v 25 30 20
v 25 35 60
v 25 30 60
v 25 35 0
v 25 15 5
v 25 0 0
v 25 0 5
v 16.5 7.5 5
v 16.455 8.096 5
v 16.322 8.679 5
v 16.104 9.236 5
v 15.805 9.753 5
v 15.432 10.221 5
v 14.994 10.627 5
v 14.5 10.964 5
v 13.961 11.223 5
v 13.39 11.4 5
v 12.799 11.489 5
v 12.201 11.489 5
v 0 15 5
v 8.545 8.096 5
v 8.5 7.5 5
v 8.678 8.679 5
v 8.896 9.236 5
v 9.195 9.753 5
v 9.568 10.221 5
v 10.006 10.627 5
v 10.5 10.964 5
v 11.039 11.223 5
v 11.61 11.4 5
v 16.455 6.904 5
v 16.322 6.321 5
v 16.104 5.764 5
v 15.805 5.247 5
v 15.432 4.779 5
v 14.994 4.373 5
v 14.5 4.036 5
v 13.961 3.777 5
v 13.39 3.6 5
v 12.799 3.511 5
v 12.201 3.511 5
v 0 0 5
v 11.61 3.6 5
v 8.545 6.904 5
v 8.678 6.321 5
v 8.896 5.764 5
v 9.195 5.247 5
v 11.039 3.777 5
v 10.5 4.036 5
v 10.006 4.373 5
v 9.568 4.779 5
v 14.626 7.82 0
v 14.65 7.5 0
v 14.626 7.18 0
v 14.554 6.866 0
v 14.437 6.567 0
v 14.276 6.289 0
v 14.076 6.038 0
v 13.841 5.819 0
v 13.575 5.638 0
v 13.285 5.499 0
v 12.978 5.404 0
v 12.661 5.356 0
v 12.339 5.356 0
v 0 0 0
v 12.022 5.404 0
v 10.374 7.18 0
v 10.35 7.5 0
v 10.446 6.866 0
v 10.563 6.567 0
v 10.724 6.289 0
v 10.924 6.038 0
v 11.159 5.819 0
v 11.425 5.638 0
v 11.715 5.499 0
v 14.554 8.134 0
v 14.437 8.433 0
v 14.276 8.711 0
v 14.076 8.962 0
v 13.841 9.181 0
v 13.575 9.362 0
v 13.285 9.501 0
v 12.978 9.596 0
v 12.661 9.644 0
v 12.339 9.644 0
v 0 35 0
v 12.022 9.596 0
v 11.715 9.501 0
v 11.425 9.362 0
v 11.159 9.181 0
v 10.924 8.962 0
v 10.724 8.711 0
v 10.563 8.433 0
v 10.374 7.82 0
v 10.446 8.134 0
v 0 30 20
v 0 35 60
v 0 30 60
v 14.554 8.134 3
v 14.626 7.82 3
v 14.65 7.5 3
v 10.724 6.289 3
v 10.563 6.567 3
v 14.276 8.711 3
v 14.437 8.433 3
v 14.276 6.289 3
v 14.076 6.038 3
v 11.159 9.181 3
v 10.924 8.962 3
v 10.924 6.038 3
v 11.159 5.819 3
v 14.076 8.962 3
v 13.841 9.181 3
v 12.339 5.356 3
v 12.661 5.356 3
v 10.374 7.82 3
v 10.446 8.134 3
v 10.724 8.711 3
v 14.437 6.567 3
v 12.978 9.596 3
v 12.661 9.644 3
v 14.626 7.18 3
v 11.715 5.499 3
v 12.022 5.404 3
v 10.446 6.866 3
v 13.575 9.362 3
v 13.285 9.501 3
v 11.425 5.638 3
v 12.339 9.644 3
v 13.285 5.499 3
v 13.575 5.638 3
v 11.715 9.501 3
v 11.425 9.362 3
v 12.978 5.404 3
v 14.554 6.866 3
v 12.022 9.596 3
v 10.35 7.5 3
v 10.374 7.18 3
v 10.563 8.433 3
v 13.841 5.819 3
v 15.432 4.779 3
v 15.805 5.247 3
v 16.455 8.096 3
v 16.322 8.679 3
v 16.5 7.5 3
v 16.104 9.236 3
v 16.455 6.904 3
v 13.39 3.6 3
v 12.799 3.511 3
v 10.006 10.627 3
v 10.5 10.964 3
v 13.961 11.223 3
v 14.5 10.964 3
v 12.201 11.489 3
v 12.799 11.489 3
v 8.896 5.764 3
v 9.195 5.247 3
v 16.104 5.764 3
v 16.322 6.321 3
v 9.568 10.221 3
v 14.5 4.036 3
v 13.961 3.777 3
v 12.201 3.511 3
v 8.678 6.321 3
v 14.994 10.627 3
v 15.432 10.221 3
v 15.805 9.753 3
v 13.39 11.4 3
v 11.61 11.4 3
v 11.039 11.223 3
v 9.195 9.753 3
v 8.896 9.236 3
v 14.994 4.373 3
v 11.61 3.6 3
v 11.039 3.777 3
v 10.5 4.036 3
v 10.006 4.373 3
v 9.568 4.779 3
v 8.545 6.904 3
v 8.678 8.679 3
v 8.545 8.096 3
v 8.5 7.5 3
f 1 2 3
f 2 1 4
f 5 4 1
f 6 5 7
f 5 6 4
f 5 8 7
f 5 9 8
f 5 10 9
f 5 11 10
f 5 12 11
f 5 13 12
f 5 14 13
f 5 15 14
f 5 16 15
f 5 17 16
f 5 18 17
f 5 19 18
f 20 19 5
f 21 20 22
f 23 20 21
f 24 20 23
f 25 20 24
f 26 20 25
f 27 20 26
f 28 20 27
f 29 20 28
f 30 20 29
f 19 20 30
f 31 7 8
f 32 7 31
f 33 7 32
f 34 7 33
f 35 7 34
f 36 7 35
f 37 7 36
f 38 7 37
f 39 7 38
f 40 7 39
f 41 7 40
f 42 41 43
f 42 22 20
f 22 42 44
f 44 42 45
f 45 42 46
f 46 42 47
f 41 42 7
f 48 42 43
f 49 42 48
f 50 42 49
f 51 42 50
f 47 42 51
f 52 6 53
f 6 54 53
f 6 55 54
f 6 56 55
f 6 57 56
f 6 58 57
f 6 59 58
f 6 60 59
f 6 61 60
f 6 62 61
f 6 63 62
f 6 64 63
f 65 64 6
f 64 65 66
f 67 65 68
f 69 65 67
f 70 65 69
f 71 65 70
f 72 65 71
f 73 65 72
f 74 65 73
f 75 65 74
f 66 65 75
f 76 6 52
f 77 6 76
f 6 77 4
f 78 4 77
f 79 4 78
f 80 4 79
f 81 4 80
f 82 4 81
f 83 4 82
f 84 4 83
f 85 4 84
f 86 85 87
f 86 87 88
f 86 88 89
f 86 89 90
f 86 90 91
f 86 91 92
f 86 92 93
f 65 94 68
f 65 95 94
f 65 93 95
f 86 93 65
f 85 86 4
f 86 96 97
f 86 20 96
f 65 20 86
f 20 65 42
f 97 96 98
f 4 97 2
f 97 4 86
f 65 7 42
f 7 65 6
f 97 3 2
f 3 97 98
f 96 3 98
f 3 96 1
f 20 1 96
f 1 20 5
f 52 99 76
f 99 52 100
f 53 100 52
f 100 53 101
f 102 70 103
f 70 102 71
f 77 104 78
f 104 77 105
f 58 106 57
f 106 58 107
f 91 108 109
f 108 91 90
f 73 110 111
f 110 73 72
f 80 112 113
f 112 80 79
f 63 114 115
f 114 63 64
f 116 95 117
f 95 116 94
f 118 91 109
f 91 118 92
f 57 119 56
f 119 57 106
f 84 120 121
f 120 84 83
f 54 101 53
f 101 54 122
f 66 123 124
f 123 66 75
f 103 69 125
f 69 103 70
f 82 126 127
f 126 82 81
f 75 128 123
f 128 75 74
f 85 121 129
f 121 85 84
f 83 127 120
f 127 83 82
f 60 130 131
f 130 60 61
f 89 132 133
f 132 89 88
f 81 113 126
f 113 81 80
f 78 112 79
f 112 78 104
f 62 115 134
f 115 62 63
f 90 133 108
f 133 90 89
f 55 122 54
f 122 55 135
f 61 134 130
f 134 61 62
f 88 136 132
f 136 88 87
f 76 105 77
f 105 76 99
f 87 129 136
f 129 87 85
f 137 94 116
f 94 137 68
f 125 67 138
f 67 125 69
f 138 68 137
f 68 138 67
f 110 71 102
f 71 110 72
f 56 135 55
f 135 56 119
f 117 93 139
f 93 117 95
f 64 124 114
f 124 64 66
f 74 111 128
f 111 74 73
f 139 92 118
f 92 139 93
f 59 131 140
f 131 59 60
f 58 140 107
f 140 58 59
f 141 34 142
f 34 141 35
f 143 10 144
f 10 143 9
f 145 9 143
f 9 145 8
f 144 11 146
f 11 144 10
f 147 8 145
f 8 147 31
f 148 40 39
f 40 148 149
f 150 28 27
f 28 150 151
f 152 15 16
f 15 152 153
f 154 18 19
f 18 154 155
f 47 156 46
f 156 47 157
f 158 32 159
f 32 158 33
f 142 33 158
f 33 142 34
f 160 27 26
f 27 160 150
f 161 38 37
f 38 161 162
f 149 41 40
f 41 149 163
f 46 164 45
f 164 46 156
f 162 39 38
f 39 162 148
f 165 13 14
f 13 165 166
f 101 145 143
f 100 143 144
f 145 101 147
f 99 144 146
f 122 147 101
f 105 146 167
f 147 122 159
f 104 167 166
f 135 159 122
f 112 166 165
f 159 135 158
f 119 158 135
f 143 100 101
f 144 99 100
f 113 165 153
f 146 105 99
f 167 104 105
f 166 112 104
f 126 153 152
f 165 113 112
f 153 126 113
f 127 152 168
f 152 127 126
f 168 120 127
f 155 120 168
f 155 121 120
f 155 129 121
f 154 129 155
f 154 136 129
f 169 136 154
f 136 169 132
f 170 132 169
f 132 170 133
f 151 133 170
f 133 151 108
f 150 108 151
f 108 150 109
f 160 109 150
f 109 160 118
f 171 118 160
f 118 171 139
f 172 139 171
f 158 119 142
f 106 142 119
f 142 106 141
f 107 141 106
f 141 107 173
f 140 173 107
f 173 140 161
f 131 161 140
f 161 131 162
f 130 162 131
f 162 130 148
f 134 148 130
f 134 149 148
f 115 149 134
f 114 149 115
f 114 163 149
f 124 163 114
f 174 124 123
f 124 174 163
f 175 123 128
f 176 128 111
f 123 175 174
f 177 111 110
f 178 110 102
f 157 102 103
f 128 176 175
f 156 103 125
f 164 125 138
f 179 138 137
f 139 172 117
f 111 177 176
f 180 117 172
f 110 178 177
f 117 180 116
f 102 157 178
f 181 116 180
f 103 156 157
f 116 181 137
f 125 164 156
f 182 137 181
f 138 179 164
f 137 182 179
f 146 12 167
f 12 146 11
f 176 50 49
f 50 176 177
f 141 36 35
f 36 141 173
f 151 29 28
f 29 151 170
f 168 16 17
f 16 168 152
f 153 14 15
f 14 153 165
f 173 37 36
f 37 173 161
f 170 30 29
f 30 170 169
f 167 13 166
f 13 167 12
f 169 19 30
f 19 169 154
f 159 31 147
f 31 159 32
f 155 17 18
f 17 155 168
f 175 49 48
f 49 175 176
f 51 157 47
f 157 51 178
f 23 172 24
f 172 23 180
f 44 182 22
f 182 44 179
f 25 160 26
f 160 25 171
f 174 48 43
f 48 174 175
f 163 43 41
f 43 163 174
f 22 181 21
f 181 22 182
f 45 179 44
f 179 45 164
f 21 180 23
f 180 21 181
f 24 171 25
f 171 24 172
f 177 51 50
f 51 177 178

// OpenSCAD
flask_dia = 88;
flask_height = 150;
flask_dist = 10;

holder_dia = 90;
holder_depth = holder_dia;
holder_width_factor = 4;
holder_width = flask_dist + holder_dia / holder_width_factor;
holder_height = 5;

rim_height = 20;
rim_width = 3;
rim_dia = holder_dia + (2 * rim_width);

screw_dia = 4.3;
head_dia = 8.0;
bite = 3.0;

single_screw_off = 10;
double_screw_off = 10;

tank_w = 25;
tank_d = 35;
tank_h = 60;
tank_wall = 5;
tank_prism = 15;
tank_screw_off = (tank_d - tank_wall - tank_prism) / 2;

$fn = 42;

module prism(l, w, h) {
    polyhedron(
        points = [[0,0,0], [l,0,0], [l,w,0], [0,w,0], [0,w,h], [l,w,h]],
        faces = [[0,1,2,3],[5,4,3,2],[0,4,5,1],[0,3,4],[5,2,1]]
    );
}

module screw(h = flask_height) {
    translate([0, 0, -1])
    cylinder(d = screw_dia, h = h + 1);
    
    translate([0, 0, bite])
    cylinder(d = head_dia, h = h - bite);
}

module tank_mount() {
    difference() {
        union() {
            cube([tank_w, tank_d, tank_wall]);
            
            translate([0, tank_d - tank_wall, 0])
            cube([tank_w, tank_wall, tank_h]);
            
            translate([0, tank_d - tank_wall - tank_prism, tank_wall])
            prism(tank_w, tank_prism, tank_prism);
        }
        
        translate([tank_w / 2, tank_screw_off, 0])
        screw(tank_h);
    }
}

module flasks() {
    translate([holder_dia / 2, holder_dia / 2, 0])
    cylinder(d = flask_dia, h = flask_height);
    
    translate([holder_dia * 3 / 2 + flask_dist, holder_dia / 2, 0])
    cylinder(d = flask_dia, h = flask_height);
    
    translate([holder_dia * 5 / 2 + flask_dist * 2, holder_dia / 2, 0])
    cylinder(d = flask_dia, h = flask_height);
}

module rim() {
    translate([rim_dia / 2, rim_dia / 2, 0])
    difference() {
        cylinder(d = rim_dia, h = rim_height);
        
        translate([0, 0, -1])
        cylinder(d = holder_dia, h = rim_height + 2);
        
        translate([-holder_dia / 2 + holder_dia / holder_width_factor, -rim_dia / 2 - 1, -1])
        cube([rim_dia, rim_dia + 2, rim_height + 2]);
    }
}

module single_holder(screws = true) {
    difference() {
        union() {
            hull() {
            cube([holder_width, holder_depth, holder_height]);
            
            translate([flask_dist - rim_width, -rim_width, holder_height])
            rim();
            }
        }
        
        translate([holder_dia / 2 + flask_dist, holder_dia / 2, -1])
        cylinder(d = holder_dia, h = holder_height + rim_height + 2);
        
        if (screws) {
            translate([single_screw_off, single_screw_off, 0])
            screw();
            
            translate([single_screw_off, holder_depth - single_screw_off, 0])
            screw();
        }
    }
}

module double_holder() {
    difference() {
        union() {
            translate([holder_width, holder_depth, 0])
            rotate([0, 0, 180])
            single_holder(false);
            
            translate([holder_width - flask_dist, 0, 0])
            single_holder(false);
        }
        
        translate([holder_width - flask_dist / 2, double_screw_off, 0])
        screw();
        
        translate([holder_width - flask_dist / 2, holder_depth - double_screw_off, 0])
        screw();
    }
}

module holders() {
    translate([flask_dist, 0, 0]) {
        %flasks();

        translate([-flask_dist, 0, 0])
        single_holder();

        translate([holder_dia - holder_width + flask_dist, 0, 0])
        double_holder();

        translate([2 * (holder_dia + flask_dist) - holder_width, 0, 0])
        double_holder();

        translate([3 * (holder_dia + flask_dist), holder_depth, 0])
        rotate([0, 0, 180])
        single_holder();
    }
}

//screw();
//rim();

//holders();
//single_holder();
//double_holder();

tank_mount();
